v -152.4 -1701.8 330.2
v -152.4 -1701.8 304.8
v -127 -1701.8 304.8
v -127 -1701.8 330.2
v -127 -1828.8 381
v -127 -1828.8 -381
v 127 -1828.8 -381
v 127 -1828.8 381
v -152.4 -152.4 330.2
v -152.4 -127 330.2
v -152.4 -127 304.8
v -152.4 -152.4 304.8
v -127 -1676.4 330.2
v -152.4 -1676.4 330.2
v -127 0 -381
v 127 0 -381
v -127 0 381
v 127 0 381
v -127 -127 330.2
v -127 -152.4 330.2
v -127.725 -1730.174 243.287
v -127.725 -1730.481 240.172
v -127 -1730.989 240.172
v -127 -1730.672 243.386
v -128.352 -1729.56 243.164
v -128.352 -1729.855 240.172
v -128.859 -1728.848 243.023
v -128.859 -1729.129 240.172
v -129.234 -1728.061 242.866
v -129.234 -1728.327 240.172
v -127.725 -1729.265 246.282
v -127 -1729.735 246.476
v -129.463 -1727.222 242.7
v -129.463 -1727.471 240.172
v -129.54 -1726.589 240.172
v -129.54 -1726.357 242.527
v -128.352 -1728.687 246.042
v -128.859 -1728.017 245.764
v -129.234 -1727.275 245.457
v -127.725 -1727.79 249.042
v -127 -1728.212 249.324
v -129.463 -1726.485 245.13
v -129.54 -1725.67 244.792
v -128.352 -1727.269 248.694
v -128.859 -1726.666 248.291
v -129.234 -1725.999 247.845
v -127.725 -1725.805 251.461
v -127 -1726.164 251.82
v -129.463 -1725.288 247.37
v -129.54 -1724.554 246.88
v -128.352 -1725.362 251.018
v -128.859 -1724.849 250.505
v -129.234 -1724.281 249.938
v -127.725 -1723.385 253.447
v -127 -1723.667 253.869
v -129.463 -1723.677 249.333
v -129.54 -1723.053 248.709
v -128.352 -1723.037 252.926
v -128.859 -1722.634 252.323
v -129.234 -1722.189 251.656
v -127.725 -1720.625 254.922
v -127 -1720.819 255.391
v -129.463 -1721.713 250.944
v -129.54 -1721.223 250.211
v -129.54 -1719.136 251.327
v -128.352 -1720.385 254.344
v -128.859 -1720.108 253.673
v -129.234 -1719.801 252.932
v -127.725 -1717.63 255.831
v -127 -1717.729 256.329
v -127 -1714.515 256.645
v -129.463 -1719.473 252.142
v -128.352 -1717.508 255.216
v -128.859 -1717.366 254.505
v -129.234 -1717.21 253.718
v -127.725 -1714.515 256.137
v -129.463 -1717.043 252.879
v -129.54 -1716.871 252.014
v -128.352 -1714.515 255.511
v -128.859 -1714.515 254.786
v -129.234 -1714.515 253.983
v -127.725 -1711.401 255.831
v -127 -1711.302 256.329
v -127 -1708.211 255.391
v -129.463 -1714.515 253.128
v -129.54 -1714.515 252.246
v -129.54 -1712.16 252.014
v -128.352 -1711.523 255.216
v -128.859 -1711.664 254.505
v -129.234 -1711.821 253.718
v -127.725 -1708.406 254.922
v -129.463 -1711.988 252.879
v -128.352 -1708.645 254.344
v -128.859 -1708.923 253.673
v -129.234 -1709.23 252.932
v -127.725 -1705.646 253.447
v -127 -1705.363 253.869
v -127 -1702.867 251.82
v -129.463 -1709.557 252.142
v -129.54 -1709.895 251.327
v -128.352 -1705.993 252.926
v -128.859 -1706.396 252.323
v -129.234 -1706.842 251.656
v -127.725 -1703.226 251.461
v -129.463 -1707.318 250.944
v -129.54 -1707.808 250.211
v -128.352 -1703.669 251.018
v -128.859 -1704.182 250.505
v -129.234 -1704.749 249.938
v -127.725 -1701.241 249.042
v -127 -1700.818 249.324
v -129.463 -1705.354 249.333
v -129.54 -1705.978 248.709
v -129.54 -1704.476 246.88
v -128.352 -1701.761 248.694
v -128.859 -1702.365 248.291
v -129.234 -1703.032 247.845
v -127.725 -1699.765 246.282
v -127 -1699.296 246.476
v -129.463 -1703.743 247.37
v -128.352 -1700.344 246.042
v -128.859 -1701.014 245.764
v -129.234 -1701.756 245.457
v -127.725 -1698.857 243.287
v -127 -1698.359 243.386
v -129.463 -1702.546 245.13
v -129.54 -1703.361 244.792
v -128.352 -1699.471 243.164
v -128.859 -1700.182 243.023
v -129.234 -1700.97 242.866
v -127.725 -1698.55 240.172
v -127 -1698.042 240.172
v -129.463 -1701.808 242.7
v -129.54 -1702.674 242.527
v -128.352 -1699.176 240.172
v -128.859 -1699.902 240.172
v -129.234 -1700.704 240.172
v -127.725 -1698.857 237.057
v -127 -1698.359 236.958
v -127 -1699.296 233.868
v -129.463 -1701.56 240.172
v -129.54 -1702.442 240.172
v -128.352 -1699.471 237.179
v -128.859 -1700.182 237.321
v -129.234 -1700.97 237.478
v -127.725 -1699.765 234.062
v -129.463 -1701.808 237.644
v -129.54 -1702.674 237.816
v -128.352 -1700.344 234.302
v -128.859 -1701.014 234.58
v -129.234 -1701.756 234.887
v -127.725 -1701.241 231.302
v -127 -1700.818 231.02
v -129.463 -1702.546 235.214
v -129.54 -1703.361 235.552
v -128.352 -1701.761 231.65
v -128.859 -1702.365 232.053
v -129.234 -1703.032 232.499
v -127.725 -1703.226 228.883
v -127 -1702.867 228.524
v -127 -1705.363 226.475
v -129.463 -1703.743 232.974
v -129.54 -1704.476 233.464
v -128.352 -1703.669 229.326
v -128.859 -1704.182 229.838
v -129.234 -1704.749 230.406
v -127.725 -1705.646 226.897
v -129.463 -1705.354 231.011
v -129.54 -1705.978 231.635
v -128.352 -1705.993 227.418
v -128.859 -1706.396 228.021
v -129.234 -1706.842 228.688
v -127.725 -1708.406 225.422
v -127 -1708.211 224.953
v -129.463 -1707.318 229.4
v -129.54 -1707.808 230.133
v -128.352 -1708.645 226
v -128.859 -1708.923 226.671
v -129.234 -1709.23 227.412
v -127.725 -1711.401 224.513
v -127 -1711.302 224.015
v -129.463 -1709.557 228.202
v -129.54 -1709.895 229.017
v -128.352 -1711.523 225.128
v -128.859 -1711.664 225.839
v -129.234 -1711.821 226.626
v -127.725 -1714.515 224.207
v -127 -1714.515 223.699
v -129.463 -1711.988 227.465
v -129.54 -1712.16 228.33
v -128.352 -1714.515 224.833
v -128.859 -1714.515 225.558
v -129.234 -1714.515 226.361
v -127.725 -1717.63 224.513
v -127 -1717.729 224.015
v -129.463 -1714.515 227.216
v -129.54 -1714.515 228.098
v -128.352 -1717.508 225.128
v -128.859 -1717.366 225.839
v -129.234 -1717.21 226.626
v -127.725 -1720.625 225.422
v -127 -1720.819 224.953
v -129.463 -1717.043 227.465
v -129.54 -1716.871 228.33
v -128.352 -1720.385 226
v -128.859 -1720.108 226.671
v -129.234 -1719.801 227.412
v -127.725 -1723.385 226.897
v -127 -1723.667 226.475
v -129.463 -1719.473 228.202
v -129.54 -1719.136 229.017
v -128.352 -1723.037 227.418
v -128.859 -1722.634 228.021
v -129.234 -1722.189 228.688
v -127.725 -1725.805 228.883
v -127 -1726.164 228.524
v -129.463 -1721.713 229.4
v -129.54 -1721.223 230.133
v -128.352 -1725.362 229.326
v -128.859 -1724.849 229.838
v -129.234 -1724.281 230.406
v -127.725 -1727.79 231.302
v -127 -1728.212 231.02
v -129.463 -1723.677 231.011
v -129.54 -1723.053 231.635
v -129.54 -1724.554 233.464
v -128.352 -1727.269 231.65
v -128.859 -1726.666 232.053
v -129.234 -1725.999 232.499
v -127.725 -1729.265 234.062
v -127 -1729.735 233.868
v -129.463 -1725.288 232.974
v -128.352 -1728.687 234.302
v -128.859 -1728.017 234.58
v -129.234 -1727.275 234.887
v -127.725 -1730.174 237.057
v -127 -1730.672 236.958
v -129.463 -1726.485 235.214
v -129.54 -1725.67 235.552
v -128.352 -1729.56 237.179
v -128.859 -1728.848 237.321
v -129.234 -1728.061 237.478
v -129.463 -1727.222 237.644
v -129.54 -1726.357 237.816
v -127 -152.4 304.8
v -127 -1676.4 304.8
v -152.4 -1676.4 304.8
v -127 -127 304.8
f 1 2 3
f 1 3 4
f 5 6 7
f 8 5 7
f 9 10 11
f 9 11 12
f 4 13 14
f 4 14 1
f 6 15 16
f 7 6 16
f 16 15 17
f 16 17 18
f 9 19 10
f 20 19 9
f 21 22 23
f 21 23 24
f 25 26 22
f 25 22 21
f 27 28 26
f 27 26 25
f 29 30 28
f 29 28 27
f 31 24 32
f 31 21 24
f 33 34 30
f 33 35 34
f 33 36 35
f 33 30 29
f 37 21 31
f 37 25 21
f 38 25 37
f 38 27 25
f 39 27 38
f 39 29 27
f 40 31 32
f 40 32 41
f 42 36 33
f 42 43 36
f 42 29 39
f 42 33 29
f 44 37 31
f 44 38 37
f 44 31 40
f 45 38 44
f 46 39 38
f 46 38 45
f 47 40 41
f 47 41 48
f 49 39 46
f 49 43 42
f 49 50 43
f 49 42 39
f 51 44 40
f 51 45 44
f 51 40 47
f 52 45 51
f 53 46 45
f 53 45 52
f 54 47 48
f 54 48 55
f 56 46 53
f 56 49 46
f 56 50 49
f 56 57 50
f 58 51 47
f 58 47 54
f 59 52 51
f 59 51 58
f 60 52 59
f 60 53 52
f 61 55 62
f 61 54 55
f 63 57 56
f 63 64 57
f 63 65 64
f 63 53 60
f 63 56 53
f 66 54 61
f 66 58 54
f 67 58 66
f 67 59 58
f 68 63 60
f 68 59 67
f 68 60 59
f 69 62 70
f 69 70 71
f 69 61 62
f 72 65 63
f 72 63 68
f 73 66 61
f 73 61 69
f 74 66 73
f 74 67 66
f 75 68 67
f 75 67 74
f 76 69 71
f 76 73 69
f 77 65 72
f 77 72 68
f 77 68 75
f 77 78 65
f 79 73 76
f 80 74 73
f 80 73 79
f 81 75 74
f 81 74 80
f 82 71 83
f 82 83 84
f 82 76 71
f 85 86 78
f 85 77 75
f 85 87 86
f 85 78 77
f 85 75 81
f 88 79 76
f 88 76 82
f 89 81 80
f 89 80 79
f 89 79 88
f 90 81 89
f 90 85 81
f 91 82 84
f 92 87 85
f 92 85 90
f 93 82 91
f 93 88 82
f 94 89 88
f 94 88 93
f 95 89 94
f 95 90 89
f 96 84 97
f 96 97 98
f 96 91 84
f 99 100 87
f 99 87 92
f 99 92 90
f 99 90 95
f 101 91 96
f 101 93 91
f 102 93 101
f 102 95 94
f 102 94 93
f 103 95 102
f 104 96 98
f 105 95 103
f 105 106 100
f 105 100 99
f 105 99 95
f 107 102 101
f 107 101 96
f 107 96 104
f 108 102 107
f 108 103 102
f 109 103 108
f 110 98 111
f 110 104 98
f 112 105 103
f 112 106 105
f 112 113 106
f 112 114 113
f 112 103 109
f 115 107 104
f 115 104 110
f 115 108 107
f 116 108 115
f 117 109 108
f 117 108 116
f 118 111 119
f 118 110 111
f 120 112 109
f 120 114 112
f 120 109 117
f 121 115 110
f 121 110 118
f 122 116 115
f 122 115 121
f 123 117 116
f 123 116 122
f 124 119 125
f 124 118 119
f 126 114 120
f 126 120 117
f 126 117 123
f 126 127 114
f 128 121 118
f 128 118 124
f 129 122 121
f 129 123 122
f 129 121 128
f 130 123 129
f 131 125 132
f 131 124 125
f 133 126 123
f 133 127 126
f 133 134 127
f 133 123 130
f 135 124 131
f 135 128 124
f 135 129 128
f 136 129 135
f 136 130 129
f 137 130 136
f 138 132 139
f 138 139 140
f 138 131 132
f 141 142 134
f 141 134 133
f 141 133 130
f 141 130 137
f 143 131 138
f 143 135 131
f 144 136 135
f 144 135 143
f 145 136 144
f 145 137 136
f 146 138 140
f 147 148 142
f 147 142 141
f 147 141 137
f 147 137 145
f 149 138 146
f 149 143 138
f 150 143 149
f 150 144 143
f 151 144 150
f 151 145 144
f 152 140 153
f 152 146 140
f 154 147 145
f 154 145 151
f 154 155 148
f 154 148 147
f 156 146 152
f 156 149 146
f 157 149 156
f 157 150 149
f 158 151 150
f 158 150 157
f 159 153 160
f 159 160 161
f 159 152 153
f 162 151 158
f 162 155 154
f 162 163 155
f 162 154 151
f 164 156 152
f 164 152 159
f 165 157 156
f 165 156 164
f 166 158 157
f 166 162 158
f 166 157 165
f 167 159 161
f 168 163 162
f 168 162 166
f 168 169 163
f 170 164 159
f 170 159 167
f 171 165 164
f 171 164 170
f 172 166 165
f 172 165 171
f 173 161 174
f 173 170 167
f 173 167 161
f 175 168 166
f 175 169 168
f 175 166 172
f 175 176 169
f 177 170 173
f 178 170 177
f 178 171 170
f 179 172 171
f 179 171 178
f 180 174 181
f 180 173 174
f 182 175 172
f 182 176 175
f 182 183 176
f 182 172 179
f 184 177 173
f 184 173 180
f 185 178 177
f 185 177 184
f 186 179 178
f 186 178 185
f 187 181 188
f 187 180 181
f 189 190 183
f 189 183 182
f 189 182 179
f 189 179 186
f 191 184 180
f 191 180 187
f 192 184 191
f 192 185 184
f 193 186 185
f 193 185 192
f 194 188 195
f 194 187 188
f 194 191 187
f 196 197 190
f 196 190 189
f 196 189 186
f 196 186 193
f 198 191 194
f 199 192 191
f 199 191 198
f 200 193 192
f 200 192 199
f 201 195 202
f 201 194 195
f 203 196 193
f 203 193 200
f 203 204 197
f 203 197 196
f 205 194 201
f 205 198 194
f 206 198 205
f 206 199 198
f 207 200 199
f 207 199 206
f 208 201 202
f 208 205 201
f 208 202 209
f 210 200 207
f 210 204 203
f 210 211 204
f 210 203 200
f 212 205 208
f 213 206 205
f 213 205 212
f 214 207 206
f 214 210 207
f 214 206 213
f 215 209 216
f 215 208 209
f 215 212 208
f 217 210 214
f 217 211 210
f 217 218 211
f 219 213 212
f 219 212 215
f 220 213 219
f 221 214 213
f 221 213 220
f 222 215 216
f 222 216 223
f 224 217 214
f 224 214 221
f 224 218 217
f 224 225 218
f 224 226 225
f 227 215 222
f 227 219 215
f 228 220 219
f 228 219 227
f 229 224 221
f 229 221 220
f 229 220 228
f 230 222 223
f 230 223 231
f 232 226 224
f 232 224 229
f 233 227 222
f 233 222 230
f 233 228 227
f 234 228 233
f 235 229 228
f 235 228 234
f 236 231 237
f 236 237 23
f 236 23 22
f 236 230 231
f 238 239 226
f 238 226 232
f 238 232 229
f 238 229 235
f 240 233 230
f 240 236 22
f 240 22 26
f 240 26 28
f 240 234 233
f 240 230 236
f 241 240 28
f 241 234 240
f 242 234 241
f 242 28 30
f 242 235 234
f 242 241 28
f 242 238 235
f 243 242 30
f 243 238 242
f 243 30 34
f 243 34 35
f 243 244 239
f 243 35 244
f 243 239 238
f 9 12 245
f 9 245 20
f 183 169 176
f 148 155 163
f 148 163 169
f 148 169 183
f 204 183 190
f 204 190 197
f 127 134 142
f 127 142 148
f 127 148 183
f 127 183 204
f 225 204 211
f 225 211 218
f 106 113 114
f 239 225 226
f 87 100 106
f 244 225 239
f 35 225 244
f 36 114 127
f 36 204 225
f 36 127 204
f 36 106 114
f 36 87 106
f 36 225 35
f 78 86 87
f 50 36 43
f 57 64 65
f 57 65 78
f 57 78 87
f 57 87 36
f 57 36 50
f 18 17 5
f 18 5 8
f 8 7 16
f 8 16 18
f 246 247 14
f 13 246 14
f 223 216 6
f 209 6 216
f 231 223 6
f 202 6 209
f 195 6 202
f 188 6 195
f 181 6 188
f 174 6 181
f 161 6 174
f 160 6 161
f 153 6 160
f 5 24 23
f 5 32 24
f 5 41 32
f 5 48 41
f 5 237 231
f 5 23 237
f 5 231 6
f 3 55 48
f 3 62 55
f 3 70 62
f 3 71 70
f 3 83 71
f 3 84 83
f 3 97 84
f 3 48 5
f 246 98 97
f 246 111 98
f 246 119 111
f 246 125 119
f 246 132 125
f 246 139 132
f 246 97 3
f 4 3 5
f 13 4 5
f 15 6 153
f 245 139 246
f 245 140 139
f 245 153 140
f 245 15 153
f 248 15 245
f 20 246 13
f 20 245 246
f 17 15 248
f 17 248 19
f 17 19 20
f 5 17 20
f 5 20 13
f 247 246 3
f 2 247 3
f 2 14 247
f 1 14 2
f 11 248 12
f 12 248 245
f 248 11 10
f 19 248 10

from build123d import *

# Parameters (mm, degrees)
F0_W     = 254
F0_H     = 762
F1_DEPTH = 1828.8
F2_W     = 25.4
F2_H     = 25.4
F3_DEPTH = 25.4
F4_R     = 16.4732072573
F5_DEPTH = 2.54


# Not quite as in the source:
# - a fillet or chamfer that OpenCascade refuses, or shapes differently, is made with other operations: its cross-section is extruded or revolved along the edge and cut away or added


with BuildPart() as f1:
    # F0 (on Front) → F1 (new body)
    with BuildSketch(Plane.XZ):
        Rectangle(F0_W, F0_H)
    extrude(amount=F1_DEPTH)

    # F2 (on face) → F3 (join)
    with BuildSketch(Plane(origin=(-127, 0, 0), x_dir=(0, -1, 0), z_dir=(-1, 0, 0))):
        with Locations((1689.1, 317.5)):
            Rectangle(F2_W, F2_H)
        with Locations((139.7, 317.5)):
            Rectangle(F2_W, F2_H)
    extrude(amount=F3_DEPTH)

    # F4 (on face) → F5 (join)
    with BuildSketch(Plane(origin=(-127, 0, 0), x_dir=(0, -1, 0), z_dir=(-1, 0, 0))):
        with Locations((1714.5154476166, 240.1719689369)):
            Circle(F4_R)
    extrude(amount=F5_DEPTH)

    # F6: fillet of radius 5.08 on 1 edges, made by hand

    # F6_s1 → F6_t2 (revolve, cut)
    with BuildSketch(Plane.XY.offset(240.1719689369)):
        with BuildLine():
            ThreePointArc((-127, -1730.9886548739), (-128.8594090512, -1729.1292458227), (-129.54, -1726.5892458227))
            Line((-129.54, -1726.5892458227), (-129.54, -1730.9886548739))
            Line((-129.54, -1730.9886548739), (-127, -1730.9886548739))
        make_face()
    revolve(axis=Axis((-129.54, -1714.5154476166, 240.1719689369), (-1, 0, 0)), mode=Mode.SUBTRACT)


solid = f1.part
